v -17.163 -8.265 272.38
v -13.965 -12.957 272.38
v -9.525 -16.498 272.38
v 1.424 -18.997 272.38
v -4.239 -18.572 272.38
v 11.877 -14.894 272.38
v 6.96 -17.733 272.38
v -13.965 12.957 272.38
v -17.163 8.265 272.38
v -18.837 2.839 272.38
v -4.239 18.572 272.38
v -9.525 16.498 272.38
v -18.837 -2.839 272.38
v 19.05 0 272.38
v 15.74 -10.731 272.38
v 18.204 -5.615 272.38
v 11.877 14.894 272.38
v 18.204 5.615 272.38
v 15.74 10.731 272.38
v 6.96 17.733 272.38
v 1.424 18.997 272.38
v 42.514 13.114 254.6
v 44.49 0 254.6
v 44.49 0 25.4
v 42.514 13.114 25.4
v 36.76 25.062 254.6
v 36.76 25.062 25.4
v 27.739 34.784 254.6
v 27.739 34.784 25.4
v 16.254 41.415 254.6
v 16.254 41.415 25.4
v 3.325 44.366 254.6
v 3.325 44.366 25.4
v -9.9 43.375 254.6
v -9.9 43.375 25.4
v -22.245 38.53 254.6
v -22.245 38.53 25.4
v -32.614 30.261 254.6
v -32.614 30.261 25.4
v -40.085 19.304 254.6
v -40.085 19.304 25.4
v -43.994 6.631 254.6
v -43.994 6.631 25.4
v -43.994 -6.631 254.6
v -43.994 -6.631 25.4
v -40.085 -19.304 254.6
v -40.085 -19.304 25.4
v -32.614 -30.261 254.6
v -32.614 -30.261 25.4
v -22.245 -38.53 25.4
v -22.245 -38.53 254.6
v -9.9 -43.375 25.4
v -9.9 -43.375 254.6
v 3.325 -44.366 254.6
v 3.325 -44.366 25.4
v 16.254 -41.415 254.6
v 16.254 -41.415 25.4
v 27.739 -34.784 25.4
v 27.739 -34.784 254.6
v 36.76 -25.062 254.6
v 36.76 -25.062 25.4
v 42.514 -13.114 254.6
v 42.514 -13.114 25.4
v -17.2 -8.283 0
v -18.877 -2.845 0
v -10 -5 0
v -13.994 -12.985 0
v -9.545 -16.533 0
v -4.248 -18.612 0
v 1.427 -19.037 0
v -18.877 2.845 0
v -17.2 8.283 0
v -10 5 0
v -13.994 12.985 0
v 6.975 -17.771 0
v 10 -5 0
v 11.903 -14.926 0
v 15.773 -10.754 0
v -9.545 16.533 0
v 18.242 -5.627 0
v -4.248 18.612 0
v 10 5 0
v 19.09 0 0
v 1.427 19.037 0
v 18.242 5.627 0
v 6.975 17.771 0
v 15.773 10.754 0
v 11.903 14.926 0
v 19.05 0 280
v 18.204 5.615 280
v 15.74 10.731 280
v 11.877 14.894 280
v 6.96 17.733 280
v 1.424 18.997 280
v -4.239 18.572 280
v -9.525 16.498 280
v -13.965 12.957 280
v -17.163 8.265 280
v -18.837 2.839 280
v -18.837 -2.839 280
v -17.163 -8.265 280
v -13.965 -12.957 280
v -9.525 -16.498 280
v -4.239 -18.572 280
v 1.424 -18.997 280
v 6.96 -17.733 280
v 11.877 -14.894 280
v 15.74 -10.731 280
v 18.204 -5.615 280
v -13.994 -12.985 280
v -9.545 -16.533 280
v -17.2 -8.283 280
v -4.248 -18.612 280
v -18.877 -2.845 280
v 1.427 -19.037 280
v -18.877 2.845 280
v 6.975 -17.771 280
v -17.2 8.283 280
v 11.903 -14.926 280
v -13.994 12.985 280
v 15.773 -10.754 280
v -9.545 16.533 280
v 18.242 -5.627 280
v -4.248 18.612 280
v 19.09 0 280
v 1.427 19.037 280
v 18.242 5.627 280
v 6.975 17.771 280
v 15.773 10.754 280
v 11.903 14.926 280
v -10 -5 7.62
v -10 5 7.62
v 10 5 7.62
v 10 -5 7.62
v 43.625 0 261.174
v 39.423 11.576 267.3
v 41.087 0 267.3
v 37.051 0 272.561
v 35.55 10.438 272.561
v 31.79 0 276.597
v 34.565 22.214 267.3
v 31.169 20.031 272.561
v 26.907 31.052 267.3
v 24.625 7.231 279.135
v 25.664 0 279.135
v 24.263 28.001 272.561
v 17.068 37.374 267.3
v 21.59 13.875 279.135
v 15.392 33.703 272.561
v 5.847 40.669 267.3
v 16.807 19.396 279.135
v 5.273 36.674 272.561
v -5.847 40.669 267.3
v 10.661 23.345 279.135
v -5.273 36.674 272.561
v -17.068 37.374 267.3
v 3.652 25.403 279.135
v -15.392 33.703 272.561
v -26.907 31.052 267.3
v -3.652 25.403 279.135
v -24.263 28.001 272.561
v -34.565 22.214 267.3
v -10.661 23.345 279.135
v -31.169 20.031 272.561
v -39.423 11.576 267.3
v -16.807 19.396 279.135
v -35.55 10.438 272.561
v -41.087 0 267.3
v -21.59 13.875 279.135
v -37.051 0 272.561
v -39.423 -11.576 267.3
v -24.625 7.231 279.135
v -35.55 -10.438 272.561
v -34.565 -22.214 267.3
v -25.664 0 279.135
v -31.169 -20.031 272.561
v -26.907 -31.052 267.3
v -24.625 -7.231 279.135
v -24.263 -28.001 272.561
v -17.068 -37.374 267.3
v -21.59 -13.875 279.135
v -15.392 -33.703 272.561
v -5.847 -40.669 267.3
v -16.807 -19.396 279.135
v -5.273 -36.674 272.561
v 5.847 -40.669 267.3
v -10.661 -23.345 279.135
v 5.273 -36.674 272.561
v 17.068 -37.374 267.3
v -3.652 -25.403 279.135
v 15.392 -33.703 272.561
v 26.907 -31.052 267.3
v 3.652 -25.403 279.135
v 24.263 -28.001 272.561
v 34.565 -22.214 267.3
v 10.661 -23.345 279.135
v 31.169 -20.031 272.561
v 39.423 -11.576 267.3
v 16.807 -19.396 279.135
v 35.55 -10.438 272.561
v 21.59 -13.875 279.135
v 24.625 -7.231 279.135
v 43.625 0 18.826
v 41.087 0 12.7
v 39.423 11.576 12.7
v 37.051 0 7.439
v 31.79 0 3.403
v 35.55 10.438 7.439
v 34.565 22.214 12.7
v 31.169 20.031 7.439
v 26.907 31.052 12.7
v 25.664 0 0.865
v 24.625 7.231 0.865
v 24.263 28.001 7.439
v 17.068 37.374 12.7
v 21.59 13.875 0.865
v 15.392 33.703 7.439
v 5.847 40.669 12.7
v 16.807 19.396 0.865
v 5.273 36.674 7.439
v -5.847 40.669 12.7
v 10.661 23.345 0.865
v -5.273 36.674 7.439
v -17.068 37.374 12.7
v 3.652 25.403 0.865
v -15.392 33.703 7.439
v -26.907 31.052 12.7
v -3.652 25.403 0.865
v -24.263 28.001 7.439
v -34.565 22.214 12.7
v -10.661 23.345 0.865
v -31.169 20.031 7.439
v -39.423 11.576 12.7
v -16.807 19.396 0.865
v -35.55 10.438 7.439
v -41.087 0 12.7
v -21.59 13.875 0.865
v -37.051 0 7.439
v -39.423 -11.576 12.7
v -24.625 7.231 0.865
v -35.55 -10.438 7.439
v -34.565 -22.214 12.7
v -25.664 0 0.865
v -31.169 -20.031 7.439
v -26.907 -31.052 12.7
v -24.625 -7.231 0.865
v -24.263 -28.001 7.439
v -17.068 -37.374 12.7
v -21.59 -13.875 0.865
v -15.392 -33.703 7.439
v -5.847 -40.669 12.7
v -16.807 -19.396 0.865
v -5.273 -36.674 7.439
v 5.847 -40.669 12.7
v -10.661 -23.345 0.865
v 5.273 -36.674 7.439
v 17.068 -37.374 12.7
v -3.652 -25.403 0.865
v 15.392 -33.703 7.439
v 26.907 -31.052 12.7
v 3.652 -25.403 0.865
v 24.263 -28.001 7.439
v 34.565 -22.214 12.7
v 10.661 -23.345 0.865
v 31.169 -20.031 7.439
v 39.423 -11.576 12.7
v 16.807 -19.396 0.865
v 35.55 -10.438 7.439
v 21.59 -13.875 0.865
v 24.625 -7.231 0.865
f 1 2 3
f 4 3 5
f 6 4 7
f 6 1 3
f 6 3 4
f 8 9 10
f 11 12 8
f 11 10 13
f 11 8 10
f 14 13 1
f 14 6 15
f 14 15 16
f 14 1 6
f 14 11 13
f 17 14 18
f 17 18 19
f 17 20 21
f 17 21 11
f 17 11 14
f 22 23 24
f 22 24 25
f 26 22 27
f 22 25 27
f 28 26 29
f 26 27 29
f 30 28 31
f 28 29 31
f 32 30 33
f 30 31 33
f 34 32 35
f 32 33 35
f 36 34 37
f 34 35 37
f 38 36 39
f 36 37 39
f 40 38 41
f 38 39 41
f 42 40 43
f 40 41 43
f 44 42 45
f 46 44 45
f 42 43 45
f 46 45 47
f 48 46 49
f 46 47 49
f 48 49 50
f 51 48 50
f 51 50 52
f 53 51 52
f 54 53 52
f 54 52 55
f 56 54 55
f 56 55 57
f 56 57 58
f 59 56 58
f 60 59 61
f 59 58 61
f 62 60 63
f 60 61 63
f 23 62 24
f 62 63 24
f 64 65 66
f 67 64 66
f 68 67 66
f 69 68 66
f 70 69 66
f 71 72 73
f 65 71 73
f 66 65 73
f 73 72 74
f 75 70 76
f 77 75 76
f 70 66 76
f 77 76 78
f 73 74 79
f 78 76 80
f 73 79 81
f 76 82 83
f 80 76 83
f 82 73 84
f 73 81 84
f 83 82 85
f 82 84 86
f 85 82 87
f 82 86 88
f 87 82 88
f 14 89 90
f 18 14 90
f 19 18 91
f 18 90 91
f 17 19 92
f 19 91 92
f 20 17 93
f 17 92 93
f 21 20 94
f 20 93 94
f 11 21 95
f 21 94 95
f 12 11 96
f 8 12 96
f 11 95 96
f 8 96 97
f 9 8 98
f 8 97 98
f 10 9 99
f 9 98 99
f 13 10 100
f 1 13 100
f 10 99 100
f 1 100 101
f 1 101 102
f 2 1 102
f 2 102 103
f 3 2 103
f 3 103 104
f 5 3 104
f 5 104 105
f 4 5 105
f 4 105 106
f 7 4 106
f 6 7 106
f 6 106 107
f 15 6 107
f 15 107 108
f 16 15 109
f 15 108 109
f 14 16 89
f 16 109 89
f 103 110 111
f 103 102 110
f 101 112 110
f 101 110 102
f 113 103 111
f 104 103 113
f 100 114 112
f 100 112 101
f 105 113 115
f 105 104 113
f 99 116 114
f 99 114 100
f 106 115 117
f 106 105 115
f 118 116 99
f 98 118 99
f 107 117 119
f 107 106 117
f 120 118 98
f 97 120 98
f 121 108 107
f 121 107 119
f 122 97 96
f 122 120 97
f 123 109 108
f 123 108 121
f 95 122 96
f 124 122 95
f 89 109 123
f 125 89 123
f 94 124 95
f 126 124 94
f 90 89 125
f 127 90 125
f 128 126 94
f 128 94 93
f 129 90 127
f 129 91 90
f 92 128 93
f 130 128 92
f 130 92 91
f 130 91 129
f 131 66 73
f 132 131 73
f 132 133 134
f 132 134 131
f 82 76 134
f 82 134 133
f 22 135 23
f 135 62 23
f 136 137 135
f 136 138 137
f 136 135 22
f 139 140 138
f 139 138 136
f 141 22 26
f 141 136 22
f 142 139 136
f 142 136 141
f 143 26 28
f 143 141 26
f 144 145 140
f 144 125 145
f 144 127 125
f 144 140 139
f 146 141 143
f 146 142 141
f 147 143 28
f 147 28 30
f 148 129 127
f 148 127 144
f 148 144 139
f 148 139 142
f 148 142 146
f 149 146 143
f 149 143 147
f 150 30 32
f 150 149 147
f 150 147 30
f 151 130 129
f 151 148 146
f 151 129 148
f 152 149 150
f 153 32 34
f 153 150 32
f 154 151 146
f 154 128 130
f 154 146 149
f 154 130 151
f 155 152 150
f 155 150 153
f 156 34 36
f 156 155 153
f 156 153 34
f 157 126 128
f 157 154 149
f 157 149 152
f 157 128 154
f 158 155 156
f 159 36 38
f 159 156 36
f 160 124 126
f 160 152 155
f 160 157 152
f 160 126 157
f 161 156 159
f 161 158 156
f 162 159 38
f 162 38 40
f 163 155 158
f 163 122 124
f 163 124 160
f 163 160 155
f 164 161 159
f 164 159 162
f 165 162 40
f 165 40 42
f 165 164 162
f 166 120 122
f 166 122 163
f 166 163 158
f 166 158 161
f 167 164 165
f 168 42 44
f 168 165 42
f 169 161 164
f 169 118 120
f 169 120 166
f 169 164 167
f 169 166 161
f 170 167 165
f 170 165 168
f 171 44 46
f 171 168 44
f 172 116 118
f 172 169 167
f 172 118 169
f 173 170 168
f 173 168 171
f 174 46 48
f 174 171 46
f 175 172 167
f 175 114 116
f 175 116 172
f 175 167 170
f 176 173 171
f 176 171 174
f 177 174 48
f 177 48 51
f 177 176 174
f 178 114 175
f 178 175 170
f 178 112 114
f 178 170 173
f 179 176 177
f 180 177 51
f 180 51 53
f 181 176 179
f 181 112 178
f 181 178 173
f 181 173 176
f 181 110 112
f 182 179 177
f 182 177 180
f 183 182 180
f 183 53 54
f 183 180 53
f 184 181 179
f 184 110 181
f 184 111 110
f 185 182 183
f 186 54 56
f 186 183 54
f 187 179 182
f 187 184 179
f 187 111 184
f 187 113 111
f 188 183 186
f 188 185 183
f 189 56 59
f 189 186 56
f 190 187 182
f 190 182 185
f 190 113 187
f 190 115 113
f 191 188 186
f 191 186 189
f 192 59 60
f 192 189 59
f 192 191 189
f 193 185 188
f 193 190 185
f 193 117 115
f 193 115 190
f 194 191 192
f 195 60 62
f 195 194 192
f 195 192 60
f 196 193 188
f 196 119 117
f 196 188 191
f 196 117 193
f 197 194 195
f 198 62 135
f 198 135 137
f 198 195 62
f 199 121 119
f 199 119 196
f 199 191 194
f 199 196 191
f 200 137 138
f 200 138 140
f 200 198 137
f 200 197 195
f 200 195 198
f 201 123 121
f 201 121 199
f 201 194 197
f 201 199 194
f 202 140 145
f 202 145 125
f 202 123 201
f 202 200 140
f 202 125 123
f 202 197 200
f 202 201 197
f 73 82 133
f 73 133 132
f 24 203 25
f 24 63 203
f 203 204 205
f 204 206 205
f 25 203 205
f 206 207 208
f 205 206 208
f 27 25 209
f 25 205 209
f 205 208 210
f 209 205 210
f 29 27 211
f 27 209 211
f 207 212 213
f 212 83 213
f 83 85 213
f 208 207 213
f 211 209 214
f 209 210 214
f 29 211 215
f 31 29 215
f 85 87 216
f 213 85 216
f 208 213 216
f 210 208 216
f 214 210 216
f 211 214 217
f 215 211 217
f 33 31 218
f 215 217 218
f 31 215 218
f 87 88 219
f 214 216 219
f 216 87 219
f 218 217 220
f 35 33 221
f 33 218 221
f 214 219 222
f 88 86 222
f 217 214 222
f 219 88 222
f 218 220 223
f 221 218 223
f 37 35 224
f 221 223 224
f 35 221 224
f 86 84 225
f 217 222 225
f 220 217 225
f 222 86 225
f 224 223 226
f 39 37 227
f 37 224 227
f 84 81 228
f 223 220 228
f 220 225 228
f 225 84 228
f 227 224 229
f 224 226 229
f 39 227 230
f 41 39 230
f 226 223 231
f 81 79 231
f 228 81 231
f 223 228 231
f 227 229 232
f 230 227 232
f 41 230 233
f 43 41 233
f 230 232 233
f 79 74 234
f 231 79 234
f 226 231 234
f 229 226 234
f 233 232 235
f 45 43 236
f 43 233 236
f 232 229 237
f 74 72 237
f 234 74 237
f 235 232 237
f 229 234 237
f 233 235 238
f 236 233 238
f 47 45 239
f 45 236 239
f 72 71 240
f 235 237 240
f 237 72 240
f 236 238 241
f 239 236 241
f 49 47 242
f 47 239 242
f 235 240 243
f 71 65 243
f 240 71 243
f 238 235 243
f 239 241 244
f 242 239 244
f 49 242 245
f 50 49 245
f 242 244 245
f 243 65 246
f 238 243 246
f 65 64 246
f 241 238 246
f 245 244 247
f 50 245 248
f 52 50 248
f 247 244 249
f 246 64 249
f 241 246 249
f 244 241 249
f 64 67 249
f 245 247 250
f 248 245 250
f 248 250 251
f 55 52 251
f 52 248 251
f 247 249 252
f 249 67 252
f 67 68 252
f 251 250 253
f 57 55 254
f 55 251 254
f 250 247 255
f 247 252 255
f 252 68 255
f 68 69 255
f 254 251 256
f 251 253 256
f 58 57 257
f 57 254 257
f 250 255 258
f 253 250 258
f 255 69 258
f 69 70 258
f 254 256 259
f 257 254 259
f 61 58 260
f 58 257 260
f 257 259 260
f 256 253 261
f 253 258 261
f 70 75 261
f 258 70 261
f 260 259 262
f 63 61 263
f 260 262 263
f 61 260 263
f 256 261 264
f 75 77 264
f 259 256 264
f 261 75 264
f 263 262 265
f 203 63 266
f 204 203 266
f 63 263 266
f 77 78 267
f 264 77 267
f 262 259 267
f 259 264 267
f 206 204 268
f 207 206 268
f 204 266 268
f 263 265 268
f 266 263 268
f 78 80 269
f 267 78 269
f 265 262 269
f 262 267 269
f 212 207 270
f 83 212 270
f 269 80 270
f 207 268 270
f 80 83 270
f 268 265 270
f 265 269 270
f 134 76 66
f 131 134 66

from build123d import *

# Parameters (mm, degrees)
SKETCH1_R          = 44.49044586
EXTRUDE1_DEPTH     = 280
FILLET1_R          = 25.4
SKETCH3_W          = 20
SKETCH3_H          = 10
CUT_EXTRUDE1_DEPTH = 7.62
SKETCH4_R          = 19.05
CUT_EXTRUDE2_DEPTH = 7.62


with BuildPart() as part:
    # Sketch1 → Extrude1 (new body)
    with BuildSketch(Plane.XY):
        Circle(SKETCH1_R)
    extrude(amount=EXTRUDE1_DEPTH)

    # Fillet1
    fillet1_edges = [part.edges().sort_by_distance(p)[0] for p in [
        (-44.49044586, 0, 0),
        (-44.49044586, 0, 280),
    ]]
    fillet(fillet1_edges, radius=FILLET1_R)

    # Sketch3 → Cut-Extrude1 (cut)
    with BuildSketch(Plane(origin=(0, 0, 0), x_dir=(-1, 0, 0), z_dir=(0, 0, -1))):
        Rectangle(SKETCH3_W, SKETCH3_H)
    extrude(amount=-CUT_EXTRUDE1_DEPTH, mode=Mode.SUBTRACT)

    # Sketch4 → Cut-Extrude2 (cut)
    with BuildSketch(Plane.XY.offset(280)):
        Circle(SKETCH4_R)
    extrude(amount=-CUT_EXTRUDE2_DEPTH, mode=Mode.SUBTRACT)


solid = part.part
